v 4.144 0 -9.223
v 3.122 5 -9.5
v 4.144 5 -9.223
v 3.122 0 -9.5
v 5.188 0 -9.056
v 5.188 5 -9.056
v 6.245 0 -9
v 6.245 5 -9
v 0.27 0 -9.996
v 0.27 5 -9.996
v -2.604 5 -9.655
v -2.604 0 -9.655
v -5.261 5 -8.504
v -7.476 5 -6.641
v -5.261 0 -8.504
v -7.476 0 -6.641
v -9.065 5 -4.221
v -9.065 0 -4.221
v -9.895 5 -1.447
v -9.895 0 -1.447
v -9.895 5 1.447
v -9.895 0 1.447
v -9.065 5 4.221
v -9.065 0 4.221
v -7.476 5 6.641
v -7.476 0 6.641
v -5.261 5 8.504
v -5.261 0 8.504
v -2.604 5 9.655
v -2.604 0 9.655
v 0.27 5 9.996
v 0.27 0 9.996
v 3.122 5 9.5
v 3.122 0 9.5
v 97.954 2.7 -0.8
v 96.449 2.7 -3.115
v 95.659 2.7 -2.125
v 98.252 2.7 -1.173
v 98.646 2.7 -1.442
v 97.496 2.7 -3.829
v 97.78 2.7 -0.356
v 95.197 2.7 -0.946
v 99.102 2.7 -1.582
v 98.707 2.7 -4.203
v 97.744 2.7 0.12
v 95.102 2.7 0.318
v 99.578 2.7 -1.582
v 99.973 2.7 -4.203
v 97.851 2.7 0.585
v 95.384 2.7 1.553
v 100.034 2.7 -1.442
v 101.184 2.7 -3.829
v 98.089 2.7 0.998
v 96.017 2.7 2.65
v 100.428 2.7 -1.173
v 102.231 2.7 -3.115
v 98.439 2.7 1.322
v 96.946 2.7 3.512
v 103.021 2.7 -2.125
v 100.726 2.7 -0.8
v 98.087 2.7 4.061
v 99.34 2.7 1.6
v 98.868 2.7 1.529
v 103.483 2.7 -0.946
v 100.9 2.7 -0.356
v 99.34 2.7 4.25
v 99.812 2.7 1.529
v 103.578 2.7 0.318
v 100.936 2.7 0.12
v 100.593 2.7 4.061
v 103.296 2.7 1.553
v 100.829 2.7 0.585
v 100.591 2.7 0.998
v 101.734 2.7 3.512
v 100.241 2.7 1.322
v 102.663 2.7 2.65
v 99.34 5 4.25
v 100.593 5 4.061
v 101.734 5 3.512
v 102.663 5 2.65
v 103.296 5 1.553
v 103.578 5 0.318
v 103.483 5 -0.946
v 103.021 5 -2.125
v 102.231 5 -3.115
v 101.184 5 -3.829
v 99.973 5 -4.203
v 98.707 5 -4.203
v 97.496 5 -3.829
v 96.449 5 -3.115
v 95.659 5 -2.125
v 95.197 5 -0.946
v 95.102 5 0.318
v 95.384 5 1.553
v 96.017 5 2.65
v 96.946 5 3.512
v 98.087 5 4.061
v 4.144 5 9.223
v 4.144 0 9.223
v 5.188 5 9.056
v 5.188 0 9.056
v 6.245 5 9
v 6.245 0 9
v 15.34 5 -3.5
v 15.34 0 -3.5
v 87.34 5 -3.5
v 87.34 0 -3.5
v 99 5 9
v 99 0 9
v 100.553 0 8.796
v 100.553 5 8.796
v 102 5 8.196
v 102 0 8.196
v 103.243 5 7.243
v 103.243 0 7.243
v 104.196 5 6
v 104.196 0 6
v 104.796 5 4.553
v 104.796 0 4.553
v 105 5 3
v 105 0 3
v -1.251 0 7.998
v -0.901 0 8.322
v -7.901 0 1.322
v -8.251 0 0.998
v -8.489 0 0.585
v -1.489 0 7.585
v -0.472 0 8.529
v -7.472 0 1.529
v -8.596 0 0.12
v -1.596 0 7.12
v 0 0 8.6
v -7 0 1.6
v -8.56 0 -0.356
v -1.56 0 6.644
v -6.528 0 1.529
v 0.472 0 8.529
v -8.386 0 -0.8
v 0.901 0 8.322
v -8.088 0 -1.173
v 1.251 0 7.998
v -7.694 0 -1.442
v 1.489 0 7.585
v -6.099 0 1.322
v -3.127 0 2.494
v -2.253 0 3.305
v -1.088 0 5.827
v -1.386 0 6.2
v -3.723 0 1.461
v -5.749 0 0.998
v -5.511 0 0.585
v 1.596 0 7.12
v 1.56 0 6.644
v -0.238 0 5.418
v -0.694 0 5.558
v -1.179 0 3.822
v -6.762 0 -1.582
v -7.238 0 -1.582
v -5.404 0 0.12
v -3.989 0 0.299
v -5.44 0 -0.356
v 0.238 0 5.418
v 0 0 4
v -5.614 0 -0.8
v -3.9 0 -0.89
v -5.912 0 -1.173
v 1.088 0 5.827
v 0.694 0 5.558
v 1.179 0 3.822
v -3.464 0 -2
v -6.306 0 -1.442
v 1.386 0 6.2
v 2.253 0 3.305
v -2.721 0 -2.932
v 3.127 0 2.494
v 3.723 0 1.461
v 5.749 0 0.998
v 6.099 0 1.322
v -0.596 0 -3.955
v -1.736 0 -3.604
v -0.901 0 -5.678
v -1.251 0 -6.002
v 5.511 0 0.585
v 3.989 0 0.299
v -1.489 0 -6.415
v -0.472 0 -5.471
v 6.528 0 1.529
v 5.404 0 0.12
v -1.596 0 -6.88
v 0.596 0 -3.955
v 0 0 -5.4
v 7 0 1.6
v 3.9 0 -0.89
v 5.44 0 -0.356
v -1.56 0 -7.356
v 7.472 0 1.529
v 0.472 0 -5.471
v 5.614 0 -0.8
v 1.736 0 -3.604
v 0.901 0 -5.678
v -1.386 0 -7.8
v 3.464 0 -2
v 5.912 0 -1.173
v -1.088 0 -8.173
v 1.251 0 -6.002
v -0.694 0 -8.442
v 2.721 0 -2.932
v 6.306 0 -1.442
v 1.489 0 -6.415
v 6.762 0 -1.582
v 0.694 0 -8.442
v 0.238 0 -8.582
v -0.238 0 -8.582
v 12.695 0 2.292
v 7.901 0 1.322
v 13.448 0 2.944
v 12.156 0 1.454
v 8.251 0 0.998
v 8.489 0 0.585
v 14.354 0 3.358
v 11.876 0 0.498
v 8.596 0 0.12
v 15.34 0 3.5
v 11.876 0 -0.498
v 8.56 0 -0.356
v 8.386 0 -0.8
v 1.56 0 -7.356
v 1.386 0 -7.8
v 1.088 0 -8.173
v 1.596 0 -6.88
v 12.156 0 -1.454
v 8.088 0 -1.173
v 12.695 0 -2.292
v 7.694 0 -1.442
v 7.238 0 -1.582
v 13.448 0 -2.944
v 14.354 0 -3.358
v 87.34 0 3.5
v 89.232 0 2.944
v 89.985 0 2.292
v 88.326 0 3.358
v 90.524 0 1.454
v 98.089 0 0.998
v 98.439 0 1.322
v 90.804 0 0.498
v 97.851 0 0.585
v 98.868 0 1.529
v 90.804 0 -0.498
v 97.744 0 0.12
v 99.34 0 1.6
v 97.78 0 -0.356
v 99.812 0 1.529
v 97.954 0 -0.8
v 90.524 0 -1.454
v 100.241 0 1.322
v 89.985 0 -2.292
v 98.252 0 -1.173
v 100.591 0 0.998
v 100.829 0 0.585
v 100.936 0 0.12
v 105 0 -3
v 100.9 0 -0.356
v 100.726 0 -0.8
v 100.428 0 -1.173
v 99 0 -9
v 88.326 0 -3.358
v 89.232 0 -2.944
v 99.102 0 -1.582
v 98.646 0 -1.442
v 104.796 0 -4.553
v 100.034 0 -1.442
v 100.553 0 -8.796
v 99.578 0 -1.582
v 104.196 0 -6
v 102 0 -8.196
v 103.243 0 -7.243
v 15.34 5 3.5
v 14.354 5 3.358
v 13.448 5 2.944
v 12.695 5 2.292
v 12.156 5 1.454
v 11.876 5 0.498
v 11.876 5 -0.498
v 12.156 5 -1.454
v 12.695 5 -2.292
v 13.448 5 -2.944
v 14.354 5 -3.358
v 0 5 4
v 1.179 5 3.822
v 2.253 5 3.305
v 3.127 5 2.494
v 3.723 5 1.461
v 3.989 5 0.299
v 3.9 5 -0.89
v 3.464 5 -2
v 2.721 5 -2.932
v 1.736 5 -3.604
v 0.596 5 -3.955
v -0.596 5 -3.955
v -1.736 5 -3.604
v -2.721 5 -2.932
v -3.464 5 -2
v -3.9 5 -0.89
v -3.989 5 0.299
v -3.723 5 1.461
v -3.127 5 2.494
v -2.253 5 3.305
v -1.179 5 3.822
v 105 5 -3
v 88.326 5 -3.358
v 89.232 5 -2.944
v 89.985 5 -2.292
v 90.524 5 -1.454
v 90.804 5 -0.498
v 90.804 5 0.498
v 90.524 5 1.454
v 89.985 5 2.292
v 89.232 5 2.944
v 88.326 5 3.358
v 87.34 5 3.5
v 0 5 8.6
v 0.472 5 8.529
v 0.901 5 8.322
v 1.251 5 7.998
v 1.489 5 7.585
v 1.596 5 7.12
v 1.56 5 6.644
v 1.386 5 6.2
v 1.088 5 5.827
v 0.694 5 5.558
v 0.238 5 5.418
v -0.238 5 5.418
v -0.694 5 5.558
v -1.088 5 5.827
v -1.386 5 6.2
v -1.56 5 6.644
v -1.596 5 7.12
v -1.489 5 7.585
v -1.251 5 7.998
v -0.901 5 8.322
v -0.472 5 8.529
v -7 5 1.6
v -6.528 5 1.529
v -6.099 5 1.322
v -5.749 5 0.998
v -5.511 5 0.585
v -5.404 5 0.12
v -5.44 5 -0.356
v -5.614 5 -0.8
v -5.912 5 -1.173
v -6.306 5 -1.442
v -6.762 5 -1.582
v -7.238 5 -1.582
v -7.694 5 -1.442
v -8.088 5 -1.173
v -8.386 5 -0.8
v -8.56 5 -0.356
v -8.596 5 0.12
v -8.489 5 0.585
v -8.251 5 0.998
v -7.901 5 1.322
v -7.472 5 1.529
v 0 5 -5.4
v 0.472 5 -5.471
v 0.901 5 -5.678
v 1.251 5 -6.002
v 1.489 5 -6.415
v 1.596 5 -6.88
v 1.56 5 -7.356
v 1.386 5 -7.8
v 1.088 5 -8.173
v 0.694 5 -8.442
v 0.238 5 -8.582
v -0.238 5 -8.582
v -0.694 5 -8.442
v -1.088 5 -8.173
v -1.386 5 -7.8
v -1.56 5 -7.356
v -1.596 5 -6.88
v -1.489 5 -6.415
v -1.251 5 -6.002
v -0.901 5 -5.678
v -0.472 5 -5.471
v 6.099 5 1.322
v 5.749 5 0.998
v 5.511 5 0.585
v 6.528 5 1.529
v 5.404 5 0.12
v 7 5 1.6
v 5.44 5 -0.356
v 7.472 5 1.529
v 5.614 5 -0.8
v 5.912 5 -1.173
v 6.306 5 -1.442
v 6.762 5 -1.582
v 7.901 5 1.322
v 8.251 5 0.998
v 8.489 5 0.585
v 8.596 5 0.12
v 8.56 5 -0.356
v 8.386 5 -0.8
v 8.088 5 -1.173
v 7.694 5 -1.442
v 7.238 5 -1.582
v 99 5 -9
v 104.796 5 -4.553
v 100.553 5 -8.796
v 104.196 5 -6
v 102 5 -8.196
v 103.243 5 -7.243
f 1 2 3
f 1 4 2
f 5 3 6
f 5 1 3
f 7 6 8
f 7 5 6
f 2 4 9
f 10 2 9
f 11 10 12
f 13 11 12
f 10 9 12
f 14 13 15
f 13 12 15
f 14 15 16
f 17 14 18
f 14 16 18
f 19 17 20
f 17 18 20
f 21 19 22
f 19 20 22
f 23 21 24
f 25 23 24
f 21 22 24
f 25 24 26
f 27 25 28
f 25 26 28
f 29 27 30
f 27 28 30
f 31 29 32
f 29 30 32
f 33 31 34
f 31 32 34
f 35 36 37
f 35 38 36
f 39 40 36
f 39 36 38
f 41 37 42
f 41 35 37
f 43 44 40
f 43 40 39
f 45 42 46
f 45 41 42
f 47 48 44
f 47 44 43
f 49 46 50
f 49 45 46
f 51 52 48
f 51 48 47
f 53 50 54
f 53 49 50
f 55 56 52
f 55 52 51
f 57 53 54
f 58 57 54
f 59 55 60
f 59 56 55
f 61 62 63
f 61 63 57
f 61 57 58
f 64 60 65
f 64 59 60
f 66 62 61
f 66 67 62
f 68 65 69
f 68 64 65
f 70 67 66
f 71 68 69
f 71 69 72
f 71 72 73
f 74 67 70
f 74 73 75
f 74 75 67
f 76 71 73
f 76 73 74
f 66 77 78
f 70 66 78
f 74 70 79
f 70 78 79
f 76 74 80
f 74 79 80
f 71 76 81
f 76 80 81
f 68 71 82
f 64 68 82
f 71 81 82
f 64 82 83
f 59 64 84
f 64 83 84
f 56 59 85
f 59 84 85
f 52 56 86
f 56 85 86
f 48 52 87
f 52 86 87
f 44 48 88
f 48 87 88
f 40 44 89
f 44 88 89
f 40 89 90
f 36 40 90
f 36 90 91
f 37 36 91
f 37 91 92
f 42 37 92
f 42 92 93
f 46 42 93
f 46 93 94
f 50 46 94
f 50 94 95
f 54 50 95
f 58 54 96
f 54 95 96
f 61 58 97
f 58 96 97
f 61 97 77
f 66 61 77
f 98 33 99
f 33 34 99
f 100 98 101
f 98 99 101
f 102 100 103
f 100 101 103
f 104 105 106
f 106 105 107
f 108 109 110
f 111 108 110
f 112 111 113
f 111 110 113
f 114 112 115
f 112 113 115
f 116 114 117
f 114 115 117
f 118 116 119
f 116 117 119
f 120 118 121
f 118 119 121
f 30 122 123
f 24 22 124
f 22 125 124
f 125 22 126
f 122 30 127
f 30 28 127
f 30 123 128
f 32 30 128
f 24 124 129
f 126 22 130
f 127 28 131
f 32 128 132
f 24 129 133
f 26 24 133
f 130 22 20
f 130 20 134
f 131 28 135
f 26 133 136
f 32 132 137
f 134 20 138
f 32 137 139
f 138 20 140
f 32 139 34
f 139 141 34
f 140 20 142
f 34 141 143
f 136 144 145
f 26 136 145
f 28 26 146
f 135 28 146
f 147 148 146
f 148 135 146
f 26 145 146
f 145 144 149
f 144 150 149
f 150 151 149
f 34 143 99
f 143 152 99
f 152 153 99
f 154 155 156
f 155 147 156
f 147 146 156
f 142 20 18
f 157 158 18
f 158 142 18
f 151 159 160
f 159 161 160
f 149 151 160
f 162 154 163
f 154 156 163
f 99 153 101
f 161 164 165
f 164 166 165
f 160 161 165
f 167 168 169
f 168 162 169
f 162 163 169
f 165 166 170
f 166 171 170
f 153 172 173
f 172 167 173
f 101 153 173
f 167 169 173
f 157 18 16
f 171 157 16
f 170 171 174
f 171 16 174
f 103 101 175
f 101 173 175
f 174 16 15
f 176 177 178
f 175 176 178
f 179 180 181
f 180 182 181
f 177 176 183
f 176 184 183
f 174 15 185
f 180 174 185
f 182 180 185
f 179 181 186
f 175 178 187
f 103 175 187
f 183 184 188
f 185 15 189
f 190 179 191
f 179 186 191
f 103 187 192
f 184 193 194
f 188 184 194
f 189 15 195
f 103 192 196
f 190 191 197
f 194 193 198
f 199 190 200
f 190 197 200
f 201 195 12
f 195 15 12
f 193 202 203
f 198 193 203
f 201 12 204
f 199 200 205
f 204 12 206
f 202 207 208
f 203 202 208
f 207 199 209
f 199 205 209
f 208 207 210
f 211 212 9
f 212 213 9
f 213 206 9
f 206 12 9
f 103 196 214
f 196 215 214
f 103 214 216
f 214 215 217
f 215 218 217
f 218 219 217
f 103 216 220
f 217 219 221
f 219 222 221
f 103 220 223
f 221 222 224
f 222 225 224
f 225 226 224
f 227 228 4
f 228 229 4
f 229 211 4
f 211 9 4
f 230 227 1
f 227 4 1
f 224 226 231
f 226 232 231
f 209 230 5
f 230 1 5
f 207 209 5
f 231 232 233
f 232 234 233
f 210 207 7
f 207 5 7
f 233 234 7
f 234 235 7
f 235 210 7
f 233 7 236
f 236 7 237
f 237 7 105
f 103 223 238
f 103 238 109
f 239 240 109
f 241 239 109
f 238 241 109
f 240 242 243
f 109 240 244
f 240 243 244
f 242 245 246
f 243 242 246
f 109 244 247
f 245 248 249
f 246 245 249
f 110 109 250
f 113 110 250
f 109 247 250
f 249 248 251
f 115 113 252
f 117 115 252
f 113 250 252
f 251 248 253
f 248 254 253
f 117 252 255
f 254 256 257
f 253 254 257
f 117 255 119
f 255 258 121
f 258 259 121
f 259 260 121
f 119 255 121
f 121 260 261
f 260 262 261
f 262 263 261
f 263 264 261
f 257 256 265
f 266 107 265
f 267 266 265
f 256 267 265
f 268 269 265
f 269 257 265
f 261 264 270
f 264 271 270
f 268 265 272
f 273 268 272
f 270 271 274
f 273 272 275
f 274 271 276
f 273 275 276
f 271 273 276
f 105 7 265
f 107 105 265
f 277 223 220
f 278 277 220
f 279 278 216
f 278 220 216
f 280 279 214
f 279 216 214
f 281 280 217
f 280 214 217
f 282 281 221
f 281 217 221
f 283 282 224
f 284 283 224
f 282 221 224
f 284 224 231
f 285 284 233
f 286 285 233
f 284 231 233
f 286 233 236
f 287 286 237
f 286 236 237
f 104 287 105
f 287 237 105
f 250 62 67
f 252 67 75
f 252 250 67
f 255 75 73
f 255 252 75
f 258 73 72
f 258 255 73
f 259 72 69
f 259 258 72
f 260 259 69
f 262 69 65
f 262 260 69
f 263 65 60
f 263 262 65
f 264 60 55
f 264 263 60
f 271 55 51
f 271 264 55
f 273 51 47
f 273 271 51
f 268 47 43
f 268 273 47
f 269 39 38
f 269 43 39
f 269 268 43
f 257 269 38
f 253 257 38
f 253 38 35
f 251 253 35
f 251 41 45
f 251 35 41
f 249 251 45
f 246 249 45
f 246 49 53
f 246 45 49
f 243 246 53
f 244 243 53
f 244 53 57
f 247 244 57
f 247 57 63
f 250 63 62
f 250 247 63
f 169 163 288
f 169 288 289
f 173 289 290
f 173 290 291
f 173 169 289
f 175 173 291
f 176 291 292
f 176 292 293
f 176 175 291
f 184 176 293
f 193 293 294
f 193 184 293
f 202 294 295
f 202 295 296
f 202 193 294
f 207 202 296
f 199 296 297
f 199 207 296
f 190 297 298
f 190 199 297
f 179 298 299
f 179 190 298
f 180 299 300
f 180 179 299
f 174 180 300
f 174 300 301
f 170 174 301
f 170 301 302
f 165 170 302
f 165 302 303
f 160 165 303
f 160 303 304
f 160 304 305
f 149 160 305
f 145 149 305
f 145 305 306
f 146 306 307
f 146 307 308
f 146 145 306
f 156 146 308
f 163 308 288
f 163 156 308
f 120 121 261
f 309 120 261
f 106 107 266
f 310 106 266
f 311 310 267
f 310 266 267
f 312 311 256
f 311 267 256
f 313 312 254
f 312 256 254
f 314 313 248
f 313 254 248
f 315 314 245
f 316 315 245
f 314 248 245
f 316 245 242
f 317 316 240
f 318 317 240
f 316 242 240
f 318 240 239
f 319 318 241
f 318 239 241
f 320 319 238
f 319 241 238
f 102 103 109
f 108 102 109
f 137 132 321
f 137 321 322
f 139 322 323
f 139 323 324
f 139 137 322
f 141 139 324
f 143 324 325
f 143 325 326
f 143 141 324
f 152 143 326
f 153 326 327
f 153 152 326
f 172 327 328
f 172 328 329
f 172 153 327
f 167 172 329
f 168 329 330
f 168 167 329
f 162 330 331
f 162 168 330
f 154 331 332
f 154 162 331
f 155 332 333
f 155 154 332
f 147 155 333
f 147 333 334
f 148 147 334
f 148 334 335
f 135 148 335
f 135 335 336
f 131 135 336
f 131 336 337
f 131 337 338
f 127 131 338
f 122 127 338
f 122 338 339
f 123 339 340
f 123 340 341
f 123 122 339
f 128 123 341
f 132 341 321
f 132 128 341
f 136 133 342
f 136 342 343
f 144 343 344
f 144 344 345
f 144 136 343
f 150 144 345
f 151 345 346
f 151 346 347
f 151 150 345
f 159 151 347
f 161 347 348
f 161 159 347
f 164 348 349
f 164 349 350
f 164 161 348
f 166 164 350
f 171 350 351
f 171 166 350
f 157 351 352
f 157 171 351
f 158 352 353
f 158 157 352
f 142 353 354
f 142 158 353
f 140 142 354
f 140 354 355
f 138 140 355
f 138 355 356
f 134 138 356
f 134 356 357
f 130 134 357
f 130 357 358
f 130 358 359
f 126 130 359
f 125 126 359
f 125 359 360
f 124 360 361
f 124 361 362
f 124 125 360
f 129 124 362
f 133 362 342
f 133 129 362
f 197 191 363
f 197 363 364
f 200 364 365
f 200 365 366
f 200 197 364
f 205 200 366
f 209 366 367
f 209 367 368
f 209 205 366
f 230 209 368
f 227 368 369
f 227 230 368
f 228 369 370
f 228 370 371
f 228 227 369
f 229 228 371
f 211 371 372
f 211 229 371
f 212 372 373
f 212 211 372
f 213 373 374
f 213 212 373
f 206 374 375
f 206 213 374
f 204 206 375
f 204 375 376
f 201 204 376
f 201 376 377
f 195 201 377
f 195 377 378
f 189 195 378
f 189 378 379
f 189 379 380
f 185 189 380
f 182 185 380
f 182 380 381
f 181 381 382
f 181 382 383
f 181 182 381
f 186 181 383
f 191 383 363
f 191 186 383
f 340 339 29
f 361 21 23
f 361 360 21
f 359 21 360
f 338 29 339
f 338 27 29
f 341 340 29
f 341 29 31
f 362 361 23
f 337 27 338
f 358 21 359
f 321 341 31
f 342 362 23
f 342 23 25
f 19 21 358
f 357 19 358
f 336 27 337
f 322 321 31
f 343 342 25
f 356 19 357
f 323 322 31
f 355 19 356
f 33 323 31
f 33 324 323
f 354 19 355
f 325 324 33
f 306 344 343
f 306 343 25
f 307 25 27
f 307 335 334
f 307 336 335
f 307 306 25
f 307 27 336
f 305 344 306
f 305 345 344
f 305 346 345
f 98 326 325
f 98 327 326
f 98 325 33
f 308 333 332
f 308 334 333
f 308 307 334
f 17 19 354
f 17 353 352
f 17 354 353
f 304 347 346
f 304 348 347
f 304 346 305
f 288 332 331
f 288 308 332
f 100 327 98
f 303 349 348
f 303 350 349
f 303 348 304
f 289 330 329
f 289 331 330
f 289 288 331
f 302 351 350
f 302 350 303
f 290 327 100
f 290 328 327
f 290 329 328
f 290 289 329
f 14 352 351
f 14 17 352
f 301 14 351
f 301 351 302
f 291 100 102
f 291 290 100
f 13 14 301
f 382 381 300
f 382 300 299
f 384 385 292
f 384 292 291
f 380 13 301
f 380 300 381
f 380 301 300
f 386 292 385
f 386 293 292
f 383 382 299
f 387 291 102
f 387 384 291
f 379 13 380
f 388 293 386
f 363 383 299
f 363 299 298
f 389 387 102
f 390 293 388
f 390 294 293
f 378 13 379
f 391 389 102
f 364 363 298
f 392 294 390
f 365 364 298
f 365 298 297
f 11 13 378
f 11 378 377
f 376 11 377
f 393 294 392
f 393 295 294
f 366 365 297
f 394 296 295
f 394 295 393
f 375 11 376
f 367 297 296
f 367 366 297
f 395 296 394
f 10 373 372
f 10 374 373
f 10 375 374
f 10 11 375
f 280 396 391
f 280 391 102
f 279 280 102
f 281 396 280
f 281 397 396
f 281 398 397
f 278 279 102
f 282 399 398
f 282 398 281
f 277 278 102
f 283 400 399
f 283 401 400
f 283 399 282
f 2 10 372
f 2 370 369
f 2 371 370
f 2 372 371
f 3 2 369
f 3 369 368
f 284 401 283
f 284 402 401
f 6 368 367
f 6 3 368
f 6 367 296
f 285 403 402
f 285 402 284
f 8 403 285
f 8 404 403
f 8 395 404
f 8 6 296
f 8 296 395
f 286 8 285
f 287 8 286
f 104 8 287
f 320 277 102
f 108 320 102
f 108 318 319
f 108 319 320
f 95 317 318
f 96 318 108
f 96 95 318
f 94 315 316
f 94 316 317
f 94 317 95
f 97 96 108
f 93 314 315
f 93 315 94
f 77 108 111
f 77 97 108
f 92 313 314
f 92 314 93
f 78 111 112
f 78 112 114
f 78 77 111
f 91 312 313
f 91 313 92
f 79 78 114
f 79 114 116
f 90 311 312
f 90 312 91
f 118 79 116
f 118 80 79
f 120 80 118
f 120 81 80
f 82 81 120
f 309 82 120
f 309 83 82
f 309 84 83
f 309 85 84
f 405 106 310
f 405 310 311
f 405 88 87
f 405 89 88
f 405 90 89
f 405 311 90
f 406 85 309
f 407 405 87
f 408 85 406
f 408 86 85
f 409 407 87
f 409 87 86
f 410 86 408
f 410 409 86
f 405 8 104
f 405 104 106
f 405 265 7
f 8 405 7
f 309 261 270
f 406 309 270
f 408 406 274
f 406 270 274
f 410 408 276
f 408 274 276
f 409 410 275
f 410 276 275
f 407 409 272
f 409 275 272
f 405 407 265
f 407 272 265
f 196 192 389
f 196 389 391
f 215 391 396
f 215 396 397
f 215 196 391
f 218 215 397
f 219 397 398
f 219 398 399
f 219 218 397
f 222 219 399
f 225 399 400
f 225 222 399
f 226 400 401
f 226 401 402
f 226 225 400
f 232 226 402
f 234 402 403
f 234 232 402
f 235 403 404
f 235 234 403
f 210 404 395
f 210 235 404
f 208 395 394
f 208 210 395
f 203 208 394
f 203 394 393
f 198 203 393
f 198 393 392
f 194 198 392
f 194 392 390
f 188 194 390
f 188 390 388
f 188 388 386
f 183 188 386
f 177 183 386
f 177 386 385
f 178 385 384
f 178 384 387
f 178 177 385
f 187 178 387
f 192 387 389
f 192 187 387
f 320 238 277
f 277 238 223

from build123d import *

# Parameters (mm, degrees)
SKETCH_1_R          = 1.6
SKETCH_1_R_2        = 9
SKETCH_1_R_3        = 4
EXTRUDE_1_DEPTH     = 5
SKETCH_2_R          = 4.25
CUT_EXTRUDE_1_DEPTH = 2.3
EXTRUDE_START       = -5
SKETCH_3_R          = 10
SKETCH_3_R_2        = 9
EXTRUDE_2_DEPTH     = 5
FILLET_1_R          = 10


with BuildPart() as part:
    # 草图1 → 凸台-拉伸1 (new body)
    # profile 1 of 2: a face of its own
    with BuildSketch(Plane(origin=(0, 0, 0), x_dir=(1, 0, 0), z_dir=(0, 1, 0))):
        with BuildLine():
            Line((99, 9), (0, 9))
            ThreePointArc((0, 9), (6.363961031, 6.363961031), (9, 0))
            ThreePointArc((9, 0), (6.363961031, -6.363961031), (0, -9))
            Line((0, -9), (99, -9))
            ThreePointArc((99, -9), (103.242640687, -7.242640687), (105, -3))
            Line((105, -3), (105, 3))
            ThreePointArc((105, 3), (103.242640687, 7.242640687), (99, 9))
        make_face()
        with BuildLine():
            ThreePointArc((15.34, -3.5), (11.84, 0), (15.34, 3.5))
            Line((15.34, 3.5), (87.34, 3.5))
            ThreePointArc((87.34, 3.5), (90.84, 0), (87.34, -3.5))
            Line((87.34, -3.5), (15.34, -3.5))
        make_face(mode=Mode.SUBTRACT)
        with Locations(Location((99.34, 0, 0), (0, 0, 270))):
            Circle(SKETCH_1_R, mode=Mode.SUBTRACT)
    # profile 2 of 2: a face of its own
    with BuildSketch(Plane(origin=(0, 0, 0), x_dir=(1, 0, 0), z_dir=(0, 1, 0))):
        Circle(SKETCH_1_R_2)
        with Locations(Location((0, -7, 0), (0, 0, 270))):
            Circle(SKETCH_1_R, mode=Mode.SUBTRACT)
        with Locations(Location((7, 0, 0), (0, 0, 270))):
            Circle(SKETCH_1_R, mode=Mode.SUBTRACT)
        with Locations(Location((0, 7, 0), (0, 0, 270))):
            Circle(SKETCH_1_R, mode=Mode.SUBTRACT)
        with Locations(Location((-7, 0, 0), (0, 0, 270))):
            Circle(SKETCH_1_R, mode=Mode.SUBTRACT)
        with Locations(Location((0, 0, 0), (0, 0, 270))):
            Circle(SKETCH_1_R_3, mode=Mode.SUBTRACT)
    extrude(amount=EXTRUDE_1_DEPTH)

    # 草图2 → 切除-拉伸1 (cut)
    with BuildSketch(Plane(origin=(0, 5, 0), x_dir=(1, 0, 0), z_dir=(0, 1, 0))):
        with Locations(Location((99.34, 0, 0), (0, 0, 270))):
            Circle(SKETCH_2_R)
    extrude(amount=-CUT_EXTRUDE_1_DEPTH, mode=Mode.SUBTRACT)

    # 草图3 → 凸台-拉伸2 (add)
    with BuildSketch(Plane(origin=(0, 5, 0), x_dir=(1, 0, 0), z_dir=(0, 1, 0)).offset(EXTRUDE_START)):
        Circle(SKETCH_3_R)
        Circle(SKETCH_3_R_2, mode=Mode.SUBTRACT)
    extrude(amount=EXTRUDE_2_DEPTH)

    # 圆角1
    fillet_1_edges = [part.edges().sort_by_distance(p)[0] for p in [
        (4.358898944, 2.5, -9),
        (4.358898944, 2.5, 9),
    ]]
    fillet(fillet_1_edges, radius=FILLET_1_R)


solid = part.part
